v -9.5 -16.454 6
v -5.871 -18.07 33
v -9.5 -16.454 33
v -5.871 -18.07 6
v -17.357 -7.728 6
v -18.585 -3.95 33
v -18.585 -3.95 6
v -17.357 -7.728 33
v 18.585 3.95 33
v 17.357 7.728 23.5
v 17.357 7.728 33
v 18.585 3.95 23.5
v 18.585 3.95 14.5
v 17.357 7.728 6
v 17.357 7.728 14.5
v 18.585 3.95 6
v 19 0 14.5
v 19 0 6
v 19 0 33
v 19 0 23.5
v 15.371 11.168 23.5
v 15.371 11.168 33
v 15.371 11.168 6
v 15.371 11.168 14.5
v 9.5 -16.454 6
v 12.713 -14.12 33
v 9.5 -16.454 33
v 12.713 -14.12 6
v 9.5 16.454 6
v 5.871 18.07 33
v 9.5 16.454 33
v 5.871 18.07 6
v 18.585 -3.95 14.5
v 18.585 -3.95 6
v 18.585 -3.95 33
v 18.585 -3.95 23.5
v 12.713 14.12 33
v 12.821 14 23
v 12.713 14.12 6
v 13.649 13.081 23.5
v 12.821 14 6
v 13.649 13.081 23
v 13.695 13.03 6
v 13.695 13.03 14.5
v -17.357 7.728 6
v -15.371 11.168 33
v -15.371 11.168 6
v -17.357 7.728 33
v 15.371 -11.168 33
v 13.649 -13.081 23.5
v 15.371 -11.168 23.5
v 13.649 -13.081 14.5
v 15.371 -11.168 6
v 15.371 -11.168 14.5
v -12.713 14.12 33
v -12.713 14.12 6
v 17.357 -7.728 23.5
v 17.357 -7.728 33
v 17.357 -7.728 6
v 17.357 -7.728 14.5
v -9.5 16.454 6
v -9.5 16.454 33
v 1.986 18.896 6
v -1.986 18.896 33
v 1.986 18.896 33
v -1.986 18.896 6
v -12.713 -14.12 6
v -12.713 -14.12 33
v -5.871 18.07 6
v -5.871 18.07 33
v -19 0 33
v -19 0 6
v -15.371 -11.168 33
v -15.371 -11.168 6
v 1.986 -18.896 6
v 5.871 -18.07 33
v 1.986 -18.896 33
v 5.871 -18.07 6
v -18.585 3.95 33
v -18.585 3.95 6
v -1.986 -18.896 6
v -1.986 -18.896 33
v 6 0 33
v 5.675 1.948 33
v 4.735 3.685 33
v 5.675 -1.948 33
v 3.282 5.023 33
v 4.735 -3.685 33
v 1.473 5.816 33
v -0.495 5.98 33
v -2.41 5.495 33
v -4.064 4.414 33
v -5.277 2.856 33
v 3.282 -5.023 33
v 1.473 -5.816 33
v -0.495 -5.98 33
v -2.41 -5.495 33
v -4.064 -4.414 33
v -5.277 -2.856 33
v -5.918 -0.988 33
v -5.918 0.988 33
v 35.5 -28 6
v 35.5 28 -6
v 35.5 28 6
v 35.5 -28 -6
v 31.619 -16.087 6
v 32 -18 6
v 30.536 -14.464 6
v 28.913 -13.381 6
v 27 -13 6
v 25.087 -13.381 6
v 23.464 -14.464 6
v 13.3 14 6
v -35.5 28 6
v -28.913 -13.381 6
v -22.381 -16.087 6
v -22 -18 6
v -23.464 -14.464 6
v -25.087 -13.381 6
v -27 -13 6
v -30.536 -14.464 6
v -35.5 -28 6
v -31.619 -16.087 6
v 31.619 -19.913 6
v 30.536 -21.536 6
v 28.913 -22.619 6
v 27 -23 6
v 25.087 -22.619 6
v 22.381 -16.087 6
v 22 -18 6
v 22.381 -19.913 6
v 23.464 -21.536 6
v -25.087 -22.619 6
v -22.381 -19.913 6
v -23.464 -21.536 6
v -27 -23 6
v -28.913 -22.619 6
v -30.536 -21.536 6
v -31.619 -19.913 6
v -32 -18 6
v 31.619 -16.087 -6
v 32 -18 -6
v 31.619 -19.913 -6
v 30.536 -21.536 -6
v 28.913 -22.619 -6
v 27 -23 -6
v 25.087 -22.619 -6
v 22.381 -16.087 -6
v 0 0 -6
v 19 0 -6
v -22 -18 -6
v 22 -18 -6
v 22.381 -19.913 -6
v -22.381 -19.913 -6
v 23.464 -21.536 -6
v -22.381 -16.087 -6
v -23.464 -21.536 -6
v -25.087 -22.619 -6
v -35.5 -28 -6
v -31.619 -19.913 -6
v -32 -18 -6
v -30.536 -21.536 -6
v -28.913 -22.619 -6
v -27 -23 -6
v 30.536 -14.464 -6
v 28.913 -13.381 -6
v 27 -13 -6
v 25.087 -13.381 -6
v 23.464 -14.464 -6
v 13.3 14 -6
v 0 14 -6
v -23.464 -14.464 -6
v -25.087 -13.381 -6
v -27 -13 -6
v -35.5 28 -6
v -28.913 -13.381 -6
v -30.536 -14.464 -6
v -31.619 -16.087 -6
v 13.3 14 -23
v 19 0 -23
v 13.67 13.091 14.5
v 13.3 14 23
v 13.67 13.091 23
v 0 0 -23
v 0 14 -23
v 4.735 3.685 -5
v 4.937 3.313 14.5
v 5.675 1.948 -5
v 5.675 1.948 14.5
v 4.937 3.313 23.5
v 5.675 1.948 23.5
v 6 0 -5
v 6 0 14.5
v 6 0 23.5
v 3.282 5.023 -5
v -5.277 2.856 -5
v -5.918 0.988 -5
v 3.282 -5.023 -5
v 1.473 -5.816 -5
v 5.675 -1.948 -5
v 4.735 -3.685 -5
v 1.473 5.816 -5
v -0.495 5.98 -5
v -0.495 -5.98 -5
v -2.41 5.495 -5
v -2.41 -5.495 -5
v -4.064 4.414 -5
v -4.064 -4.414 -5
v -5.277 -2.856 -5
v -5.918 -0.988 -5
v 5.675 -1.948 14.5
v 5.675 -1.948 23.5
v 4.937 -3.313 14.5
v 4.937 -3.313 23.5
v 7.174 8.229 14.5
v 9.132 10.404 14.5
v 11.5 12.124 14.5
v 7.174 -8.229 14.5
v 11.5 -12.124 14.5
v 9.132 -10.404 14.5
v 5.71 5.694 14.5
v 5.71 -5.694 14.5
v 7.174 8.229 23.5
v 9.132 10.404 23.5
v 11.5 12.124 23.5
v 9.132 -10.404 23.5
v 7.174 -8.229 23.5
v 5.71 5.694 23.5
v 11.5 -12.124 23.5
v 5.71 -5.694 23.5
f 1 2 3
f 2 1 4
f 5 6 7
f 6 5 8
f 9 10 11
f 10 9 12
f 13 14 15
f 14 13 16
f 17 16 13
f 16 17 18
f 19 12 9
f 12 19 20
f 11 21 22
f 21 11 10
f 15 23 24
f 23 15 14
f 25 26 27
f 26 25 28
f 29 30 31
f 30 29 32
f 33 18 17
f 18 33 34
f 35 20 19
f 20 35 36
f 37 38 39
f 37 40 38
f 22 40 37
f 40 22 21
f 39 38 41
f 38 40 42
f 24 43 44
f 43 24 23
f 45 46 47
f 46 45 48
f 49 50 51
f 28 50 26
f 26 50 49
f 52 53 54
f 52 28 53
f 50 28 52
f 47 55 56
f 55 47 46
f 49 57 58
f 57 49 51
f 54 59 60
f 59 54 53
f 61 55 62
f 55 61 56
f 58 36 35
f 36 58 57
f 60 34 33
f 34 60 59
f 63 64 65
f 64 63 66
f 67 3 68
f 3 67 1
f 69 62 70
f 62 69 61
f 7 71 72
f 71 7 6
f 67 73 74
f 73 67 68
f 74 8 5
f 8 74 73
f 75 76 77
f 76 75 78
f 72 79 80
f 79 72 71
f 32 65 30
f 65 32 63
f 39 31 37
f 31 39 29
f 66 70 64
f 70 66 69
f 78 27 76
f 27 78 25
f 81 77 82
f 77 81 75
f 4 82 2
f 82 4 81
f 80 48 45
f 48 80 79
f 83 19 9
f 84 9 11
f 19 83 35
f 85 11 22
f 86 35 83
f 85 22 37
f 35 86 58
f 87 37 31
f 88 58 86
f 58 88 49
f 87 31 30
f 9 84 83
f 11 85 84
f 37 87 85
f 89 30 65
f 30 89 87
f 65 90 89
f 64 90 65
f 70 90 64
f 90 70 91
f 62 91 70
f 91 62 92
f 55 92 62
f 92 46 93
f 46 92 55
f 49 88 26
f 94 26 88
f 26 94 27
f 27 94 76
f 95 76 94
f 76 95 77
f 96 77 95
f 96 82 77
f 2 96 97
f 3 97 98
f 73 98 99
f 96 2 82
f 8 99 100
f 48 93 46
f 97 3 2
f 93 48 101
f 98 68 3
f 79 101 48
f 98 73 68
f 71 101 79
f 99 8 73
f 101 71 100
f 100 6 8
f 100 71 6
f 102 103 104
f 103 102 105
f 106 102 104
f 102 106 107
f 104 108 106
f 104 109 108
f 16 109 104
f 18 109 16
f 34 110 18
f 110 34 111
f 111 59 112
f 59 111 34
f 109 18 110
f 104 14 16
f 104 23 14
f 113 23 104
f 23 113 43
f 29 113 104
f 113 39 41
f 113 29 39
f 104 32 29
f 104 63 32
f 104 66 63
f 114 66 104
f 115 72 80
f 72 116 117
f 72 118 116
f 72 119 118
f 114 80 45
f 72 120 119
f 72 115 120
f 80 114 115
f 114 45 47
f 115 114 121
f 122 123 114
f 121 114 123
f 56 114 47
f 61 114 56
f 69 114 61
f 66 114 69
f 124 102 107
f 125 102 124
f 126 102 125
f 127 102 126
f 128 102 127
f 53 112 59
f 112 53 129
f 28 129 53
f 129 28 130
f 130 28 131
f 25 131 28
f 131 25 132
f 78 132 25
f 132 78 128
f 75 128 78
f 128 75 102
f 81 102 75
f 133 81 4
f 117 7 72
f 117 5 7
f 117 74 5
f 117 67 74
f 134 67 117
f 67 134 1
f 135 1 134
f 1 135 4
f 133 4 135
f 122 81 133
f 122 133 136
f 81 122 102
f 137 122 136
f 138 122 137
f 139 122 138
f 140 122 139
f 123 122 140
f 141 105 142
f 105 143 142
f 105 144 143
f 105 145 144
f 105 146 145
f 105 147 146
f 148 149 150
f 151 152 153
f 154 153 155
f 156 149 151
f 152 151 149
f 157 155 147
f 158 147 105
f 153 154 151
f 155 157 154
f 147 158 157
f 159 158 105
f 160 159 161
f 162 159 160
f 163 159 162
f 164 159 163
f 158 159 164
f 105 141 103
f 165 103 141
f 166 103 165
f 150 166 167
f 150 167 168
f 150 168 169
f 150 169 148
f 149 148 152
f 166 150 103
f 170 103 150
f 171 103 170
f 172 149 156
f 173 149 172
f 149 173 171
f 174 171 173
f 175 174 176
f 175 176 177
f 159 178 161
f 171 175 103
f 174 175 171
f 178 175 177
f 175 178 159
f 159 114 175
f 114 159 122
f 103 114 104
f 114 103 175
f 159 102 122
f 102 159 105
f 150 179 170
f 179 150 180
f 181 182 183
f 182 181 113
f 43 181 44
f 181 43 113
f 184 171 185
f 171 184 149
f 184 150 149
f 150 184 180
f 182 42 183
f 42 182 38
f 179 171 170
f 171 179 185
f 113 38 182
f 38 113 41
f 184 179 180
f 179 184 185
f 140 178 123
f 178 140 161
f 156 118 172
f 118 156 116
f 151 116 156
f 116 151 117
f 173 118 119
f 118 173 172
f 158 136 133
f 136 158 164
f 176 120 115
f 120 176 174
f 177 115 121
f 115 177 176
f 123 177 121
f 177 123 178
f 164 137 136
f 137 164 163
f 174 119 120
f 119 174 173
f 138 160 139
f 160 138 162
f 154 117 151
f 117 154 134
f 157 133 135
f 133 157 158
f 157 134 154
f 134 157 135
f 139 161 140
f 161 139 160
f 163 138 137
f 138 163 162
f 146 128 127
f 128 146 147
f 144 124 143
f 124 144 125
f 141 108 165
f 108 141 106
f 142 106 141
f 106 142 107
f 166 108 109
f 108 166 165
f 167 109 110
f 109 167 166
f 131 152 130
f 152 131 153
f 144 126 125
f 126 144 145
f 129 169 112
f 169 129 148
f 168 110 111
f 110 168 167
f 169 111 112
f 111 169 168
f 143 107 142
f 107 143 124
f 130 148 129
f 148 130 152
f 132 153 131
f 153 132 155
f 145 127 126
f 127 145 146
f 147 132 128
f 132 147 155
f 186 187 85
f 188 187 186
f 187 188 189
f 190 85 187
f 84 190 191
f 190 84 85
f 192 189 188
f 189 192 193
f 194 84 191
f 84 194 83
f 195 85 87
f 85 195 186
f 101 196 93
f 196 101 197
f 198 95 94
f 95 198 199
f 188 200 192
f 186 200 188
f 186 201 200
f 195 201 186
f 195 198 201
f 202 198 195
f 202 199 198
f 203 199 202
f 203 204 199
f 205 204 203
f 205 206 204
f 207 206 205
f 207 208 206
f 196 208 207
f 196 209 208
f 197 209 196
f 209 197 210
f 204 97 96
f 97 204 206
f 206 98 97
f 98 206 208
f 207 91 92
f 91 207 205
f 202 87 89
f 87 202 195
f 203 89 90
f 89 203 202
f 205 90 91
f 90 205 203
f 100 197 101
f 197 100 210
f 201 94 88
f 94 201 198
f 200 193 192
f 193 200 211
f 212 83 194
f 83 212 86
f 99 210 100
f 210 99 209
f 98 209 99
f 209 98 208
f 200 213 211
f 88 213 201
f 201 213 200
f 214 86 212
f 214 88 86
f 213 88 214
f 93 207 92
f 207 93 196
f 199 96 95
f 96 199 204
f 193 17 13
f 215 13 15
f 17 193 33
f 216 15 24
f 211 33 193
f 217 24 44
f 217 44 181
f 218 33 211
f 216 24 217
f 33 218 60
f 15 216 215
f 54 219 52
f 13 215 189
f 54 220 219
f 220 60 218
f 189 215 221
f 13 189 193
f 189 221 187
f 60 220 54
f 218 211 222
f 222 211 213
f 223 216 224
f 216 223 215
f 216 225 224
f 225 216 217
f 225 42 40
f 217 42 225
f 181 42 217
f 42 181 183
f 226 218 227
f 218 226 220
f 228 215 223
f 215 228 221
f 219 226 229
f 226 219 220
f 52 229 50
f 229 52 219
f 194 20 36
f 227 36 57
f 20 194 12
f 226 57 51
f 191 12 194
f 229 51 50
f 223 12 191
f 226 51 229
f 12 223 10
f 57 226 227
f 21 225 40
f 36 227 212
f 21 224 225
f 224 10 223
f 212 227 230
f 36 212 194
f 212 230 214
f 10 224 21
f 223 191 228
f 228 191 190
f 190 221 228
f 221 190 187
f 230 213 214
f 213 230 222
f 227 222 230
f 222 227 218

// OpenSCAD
// Parameters
shaft_diameter_mm = 12.0; //[6.0:24.0:0.1]
shaft_clearance_mm = 0.0; //[0.0:0.5:0.01]
housing_material_clearance_mm = 0.0; //[0.0:1.0:0.05]
base_length_mm = 71.0; //[35.5:142.0:0.5]
base_width_mm = 56.0; //[28.0:112.0:0.5]
base_thickness_mm = 12.0; //[6.0:24.0:0.5]
overall_height_mm = 40.0; //[20.0:80.0:0.5]
mounting_hole_count = 2; //[2:2:1]
mounting_hole_diameter_mm = 10.0; //[5.0:16.0:0.1]
mounting_hole_center_spacing_mm = 54.0; //[30.0:90.0:0.5]
mounting_hole_offset_from_edge_mm = 10.0; //[5.0:20.0:0.5]
housing_outer_diameter_mm = 38.0; //[24.0:76.0:0.5]
housing_length_x_mm = 46.0; //[30.0:80.0:0.5]
bearing_seat_diameter_mm = 28.0; //[18.0:56.0:0.5]
bearing_seat_depth_mm = 8.0; //[3.0:20.0:0.5]
side_overlap_mm = 1.0; //[0.5:2.0:0.1]

// Right Trapezoid
module right_trapezoid() {
  color("Silver") {
    linear_extrude(height=housing_length_x_mm, center=true) {
      polygon(points=[
        [0, 0],
        [housing_outer_diameter_mm/2, 0],
        [housing_outer_diameter_mm*0.35, (overall_height_mm - base_thickness_mm)/2],
        [0, (overall_height_mm - base_thickness_mm)/2]
      ]);
    }
  }
}

// KP Pillow Block Hole Positions
module kp_pillow_block_hole_positions() {
  color("DimGray") {
    union() {
      translate([-mounting_hole_center_spacing_mm/2, -base_width_mm/2 + mounting_hole_offset_from_edge_mm, 0])
        cylinder(r=mounting_hole_diameter_mm/2, h=base_thickness_mm + 2*side_overlap_mm, center=true);
      translate([mounting_hole_center_spacing_mm/2, -base_width_mm/2 + mounting_hole_offset_from_edge_mm, 0])
        cylinder(r=mounting_hole_diameter_mm/2, h=base_thickness_mm + 2*side_overlap_mm, center=true);
    }
  }
}

// KP Pillow Block
module kp_pillow_block() {
  color("Black") {
    difference() {
      union() {
        translate([0, 0, 0])
          cube([base_length_mm, base_width_mm, base_thickness_mm], center=true);
        translate([0, 0, base_thickness_mm/2 + (overall_height_mm - base_thickness_mm)/2 - side_overlap_mm])
          intersection() {
            cylinder(r=housing_outer_diameter_mm/2, h=housing_length_x_mm, center=true);
            cube([housing_length_x_mm, housing_outer_diameter_mm, (overall_height_mm - base_thickness_mm)], center=true);
          }
        right_trapezoid();
      }
      translate([0, 0, base_thickness_mm/2 + (overall_height_mm - base_thickness_mm)/2 - side_overlap_mm])
        cylinder(r=(shaft_diameter_mm + shaft_clearance_mm)/2, h=housing_length_x_mm + 2*side_overlap_mm, center=true);
      translate([housing_length_x_mm/2 - (bearing_seat_depth_mm + side_overlap_mm)/2, 0, base_thickness_mm/2 + (overall_height_mm - base_thickness_mm)/2 - side_overlap_mm])
        cylinder(r=(bearing_seat_diameter_mm + housing_material_clearance_mm)/2, h=bearing_seat_depth_mm + side_overlap_mm, center=true);
      kp_pillow_block_hole_positions();
    }
  }
}

// KP Pillow Block Assembly
module kp_pillow_block_assembly() {
  kp_pillow_block();
}

// SCS Bearing Block Assembly
module scs_bearing_block_assembly() {
  kp_pillow_block_assembly();
}

// Final Assembly
module assembly() {
  scs_bearing_block_assembly();
}

assembly();
